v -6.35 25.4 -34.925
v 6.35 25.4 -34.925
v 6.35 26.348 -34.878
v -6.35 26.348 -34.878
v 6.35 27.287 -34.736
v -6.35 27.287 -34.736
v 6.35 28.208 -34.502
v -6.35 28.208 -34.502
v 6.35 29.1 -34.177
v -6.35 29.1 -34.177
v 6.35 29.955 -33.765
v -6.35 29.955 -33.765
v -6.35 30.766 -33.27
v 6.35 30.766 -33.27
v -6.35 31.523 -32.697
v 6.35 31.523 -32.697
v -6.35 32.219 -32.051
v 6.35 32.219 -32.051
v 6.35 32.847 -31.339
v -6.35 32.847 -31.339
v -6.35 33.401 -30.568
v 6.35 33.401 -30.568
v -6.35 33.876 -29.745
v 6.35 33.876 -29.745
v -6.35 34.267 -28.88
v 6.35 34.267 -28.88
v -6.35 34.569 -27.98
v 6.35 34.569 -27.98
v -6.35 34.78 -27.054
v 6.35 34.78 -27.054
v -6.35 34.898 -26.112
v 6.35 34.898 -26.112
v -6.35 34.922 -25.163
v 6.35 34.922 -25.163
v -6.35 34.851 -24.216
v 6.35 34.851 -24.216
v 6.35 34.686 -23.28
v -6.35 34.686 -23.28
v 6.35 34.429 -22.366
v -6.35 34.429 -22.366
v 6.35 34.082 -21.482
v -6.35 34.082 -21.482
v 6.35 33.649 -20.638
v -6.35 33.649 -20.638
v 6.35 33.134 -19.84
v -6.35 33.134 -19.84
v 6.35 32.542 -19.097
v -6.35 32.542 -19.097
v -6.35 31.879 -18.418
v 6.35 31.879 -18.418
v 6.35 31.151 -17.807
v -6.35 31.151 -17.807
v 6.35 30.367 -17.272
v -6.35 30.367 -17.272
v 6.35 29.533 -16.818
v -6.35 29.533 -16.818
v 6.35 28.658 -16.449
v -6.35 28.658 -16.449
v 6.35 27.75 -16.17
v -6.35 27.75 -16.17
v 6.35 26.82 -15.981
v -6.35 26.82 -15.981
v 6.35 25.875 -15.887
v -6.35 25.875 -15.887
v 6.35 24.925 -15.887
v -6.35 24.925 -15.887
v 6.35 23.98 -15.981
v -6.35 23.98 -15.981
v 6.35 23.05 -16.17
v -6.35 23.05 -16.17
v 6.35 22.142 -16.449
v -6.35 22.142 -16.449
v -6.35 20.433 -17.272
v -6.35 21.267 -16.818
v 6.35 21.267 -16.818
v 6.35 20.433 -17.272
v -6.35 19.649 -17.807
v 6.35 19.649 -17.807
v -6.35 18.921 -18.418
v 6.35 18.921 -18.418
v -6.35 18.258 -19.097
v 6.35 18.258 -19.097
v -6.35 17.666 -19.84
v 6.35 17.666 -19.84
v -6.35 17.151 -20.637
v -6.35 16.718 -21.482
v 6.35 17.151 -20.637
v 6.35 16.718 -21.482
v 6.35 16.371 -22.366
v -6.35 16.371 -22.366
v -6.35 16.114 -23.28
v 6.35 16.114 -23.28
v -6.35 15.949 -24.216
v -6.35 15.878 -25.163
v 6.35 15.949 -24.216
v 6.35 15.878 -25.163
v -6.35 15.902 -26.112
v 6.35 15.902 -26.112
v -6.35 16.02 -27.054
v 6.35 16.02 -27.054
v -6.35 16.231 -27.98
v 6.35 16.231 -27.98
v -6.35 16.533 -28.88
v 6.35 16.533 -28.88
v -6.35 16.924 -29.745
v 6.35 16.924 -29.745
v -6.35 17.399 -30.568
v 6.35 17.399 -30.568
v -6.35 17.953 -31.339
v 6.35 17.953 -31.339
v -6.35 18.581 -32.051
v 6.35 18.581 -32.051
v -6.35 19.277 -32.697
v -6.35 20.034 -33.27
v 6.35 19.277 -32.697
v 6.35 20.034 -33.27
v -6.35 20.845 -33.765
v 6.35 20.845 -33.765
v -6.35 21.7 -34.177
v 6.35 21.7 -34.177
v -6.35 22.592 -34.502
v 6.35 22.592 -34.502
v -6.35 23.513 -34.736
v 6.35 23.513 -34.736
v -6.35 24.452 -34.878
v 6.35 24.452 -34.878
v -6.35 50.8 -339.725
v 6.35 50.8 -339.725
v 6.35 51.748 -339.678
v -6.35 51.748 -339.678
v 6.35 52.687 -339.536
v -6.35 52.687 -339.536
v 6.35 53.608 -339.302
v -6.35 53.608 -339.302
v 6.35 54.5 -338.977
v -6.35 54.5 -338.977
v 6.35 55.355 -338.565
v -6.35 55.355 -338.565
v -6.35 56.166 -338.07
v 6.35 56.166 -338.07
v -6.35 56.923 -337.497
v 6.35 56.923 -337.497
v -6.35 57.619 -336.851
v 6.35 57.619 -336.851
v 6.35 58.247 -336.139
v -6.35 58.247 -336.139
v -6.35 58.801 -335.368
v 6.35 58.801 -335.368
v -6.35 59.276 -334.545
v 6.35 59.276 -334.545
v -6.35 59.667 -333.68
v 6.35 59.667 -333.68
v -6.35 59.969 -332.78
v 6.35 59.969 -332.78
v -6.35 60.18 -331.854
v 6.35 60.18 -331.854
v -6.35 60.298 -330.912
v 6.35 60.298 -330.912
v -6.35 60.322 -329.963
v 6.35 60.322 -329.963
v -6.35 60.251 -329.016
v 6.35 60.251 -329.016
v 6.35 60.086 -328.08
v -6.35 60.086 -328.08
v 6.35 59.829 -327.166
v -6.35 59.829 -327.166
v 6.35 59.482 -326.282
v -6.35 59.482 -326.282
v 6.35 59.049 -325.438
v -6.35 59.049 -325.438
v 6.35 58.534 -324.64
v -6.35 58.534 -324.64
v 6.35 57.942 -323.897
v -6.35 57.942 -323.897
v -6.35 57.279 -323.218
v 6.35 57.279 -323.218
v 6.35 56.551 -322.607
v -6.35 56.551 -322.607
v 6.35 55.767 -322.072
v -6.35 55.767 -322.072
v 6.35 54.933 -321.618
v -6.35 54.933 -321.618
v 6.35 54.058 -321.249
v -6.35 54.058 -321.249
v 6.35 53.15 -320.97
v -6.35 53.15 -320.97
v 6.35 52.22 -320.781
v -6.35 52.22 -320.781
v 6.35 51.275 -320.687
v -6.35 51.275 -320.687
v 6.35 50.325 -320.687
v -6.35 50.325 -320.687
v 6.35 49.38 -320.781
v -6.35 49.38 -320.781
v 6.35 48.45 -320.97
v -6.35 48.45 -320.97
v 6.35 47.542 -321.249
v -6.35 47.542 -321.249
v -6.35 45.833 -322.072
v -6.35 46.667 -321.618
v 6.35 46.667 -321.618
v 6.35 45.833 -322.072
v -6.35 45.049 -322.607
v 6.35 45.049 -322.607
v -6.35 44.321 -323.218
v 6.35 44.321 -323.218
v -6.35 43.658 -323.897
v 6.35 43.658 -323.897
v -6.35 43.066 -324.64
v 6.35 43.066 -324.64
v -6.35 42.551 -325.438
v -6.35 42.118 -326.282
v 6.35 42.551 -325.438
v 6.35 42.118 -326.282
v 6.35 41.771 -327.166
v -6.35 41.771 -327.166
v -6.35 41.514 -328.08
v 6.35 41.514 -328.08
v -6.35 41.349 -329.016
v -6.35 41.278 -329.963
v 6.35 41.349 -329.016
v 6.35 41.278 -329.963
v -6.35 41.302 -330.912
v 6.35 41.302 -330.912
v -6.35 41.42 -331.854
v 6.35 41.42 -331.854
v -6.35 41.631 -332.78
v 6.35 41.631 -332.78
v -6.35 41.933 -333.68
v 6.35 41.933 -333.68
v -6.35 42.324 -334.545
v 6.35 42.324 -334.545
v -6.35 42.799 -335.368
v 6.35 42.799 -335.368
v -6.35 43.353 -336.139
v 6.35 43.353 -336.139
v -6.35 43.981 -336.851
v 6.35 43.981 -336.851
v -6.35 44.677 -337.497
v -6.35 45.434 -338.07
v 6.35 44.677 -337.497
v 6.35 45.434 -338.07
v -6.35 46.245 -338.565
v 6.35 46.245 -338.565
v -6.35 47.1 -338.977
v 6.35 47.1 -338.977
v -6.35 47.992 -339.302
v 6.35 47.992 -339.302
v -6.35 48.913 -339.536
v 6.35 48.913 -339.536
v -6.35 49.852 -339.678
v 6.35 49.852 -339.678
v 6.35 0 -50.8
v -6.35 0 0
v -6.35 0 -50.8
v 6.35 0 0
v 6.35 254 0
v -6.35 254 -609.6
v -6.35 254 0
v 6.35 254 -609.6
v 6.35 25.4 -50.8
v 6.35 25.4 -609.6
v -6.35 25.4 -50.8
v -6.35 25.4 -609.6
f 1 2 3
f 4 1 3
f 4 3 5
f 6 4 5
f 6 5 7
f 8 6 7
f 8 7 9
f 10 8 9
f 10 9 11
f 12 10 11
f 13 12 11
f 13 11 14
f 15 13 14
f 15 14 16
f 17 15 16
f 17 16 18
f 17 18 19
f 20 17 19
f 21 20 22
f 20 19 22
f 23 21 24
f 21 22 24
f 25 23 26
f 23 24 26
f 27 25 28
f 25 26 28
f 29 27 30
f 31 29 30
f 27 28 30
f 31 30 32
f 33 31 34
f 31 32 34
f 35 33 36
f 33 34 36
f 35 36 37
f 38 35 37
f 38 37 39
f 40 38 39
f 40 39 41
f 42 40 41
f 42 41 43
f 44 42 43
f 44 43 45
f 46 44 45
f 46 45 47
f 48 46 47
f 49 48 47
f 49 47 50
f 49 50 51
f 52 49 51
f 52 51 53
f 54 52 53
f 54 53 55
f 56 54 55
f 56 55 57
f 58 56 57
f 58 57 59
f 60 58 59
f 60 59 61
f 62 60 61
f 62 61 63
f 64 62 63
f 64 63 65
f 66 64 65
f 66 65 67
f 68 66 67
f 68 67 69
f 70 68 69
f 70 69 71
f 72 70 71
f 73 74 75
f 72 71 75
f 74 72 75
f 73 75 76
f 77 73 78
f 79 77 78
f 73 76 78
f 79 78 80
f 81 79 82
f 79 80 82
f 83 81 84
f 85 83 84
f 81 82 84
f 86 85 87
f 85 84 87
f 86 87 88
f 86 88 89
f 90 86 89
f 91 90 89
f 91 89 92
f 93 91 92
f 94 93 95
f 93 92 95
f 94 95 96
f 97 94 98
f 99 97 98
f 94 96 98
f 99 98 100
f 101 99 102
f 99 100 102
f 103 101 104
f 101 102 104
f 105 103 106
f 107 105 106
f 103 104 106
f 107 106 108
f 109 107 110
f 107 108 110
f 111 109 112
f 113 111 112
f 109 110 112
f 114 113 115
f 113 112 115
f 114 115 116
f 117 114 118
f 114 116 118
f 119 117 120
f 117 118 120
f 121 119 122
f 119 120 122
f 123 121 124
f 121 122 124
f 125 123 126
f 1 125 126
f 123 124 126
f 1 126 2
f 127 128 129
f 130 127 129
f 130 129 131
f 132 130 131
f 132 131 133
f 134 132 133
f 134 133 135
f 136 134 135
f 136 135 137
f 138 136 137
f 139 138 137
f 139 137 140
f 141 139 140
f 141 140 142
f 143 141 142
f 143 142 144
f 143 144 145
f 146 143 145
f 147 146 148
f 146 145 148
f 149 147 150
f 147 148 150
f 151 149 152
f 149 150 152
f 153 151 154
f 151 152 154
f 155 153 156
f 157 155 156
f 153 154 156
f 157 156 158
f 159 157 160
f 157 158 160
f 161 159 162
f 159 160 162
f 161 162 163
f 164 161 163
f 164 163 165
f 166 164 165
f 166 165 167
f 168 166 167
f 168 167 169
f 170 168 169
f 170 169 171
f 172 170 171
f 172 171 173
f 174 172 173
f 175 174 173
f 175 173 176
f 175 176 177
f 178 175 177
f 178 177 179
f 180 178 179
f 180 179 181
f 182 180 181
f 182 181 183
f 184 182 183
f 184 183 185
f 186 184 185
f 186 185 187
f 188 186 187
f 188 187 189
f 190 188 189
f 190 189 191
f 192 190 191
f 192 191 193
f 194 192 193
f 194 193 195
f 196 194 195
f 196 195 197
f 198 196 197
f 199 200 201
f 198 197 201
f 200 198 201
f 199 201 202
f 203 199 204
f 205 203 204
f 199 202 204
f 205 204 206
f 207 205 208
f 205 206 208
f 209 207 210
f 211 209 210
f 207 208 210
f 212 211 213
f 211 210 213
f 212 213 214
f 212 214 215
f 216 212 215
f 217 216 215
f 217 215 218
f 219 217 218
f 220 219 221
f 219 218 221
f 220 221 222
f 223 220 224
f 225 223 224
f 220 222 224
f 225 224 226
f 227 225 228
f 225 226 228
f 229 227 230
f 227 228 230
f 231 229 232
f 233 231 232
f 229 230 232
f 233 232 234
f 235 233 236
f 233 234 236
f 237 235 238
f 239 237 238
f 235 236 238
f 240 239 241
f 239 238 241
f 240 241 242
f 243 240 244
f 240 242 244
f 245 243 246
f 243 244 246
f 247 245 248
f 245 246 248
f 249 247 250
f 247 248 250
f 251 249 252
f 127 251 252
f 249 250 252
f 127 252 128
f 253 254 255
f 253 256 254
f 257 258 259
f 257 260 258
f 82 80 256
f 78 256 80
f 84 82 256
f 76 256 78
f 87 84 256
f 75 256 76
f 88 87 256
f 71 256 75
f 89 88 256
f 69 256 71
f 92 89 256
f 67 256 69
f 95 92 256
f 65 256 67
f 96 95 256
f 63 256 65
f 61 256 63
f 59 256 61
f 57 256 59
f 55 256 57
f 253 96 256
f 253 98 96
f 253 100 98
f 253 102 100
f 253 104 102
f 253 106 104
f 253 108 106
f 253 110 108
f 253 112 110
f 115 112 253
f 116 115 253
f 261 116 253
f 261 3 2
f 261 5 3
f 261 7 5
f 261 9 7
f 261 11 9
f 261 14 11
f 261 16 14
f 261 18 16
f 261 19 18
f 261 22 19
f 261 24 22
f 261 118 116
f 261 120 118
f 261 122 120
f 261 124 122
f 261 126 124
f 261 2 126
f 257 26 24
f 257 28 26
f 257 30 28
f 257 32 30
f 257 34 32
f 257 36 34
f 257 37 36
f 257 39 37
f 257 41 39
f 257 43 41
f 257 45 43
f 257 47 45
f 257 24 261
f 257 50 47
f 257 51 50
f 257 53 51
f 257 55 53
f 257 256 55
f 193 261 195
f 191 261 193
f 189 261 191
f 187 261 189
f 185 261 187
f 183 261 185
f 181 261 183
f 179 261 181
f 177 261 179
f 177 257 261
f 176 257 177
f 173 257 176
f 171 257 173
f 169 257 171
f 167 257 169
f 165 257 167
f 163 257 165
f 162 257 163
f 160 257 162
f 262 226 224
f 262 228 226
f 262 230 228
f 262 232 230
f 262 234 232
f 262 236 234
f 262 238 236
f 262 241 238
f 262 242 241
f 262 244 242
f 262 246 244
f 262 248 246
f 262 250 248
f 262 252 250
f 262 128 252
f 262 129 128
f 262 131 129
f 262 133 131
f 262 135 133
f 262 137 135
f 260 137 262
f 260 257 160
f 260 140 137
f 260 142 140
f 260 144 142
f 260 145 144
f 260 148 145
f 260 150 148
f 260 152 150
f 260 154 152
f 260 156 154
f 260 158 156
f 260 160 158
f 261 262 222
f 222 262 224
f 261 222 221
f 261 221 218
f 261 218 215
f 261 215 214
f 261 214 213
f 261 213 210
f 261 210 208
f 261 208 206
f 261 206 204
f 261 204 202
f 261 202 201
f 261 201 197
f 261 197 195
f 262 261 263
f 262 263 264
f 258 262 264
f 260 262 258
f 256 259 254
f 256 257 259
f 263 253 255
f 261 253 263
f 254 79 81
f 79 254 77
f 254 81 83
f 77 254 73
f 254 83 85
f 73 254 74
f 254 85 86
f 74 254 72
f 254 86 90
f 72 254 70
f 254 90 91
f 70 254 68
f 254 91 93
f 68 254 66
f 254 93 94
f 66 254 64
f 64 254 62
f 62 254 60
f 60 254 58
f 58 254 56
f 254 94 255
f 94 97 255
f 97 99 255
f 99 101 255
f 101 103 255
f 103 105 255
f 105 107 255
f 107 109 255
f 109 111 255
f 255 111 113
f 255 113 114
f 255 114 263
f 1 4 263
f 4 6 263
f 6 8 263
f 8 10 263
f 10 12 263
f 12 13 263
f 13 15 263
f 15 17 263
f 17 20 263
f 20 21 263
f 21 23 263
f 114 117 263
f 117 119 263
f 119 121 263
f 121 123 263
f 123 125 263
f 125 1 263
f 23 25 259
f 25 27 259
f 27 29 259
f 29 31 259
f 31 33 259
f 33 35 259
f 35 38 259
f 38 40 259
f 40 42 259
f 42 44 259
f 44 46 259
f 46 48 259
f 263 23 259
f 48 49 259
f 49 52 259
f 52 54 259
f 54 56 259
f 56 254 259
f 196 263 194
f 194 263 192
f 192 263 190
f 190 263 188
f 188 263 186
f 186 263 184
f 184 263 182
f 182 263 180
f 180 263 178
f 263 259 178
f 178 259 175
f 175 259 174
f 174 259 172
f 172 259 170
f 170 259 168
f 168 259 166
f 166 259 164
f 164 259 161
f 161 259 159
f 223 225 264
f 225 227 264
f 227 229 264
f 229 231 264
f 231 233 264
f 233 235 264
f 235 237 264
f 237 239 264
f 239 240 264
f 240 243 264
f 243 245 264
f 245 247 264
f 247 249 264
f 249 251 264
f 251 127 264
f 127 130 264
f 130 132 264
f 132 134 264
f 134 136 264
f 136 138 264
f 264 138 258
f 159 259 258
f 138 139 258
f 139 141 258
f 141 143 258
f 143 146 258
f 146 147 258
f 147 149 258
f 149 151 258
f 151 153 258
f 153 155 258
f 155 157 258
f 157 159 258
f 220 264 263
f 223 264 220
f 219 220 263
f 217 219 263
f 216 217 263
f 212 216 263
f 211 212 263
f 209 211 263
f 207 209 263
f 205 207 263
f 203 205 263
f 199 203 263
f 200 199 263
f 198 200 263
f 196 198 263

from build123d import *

# Parameters (mm, degrees)
BOSS_EXTRUDE1_DEPTH = 6.35
CUT_EXTRUDE1_REACH  = 14.7
SKETCH2_R           = 9.525


with BuildPart() as part:
    # Sketch1 → Boss-Extrude1 (new body, symmetric)
    with BuildSketch(Plane(origin=(0, 0, 0), x_dir=(0, 0, -1), z_dir=(1, 0, 0))):
        Polygon((0, 0), (50.8, 0), (50.8, 25.4), (609.6, 25.4), (609.6, 254), (0, 254), align=None)
    extrude(amount=BOSS_EXTRUDE1_DEPTH, both=True)

    # Sketch2 → Cut-Extrude1 (cut, up to next)
    with BuildSketch(Plane(origin=(6.35, 0, 0), x_dir=(0, 0, -1), z_dir=(1, 0, 0)), mode=Mode.PRIVATE) as cut_extrude1_sk1:
        with Locations((25.4, 25.4)):
            Circle(SKETCH2_R)
    cut_extrude1_tool1 = extrude(cut_extrude1_sk1.sketch, amount=-CUT_EXTRUDE1_REACH, mode=Mode.PRIVATE) & part.part
    add(cut_extrude1_tool1.solids().sort_by_distance((6.35, 25.4, -25.4))[0], mode=Mode.SUBTRACT)
    # Sketch2 → Cut-Extrude1 (cut, up to next)
    with BuildSketch(Plane(origin=(6.35, 0, 0), x_dir=(0, 0, -1), z_dir=(1, 0, 0)), mode=Mode.PRIVATE) as cut_extrude1_sk2:
        with Locations((330.2, 50.8)):
            Circle(SKETCH2_R)
    cut_extrude1_tool2 = extrude(cut_extrude1_sk2.sketch, amount=-CUT_EXTRUDE1_REACH, mode=Mode.PRIVATE) & part.part
    add(cut_extrude1_tool2.solids().sort_by_distance((6.35, 50.8, -330.2))[0], mode=Mode.SUBTRACT)


solid = part.part
